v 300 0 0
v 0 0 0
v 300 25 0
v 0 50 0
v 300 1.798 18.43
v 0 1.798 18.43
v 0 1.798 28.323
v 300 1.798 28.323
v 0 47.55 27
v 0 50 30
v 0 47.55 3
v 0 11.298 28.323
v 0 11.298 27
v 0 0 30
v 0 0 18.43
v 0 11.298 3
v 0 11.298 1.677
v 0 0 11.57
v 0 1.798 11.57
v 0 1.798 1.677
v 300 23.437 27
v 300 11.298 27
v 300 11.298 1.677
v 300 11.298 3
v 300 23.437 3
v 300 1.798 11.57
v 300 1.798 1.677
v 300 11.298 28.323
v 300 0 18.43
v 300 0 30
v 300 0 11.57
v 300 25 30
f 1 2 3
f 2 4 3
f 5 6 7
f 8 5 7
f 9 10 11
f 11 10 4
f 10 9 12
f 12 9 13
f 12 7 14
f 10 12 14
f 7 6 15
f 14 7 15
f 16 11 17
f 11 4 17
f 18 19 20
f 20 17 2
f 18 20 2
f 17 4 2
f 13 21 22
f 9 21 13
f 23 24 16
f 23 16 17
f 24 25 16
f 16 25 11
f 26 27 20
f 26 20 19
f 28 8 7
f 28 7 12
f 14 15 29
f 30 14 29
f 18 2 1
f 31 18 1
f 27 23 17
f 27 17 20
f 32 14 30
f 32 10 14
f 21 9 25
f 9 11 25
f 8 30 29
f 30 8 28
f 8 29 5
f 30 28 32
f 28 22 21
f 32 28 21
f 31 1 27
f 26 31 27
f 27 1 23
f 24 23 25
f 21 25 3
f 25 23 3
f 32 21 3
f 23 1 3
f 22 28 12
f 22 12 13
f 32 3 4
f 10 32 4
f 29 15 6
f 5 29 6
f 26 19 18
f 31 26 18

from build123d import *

# Parameters (mm, degrees)
EXTRUDE_1_DEPTH          = 30
CUT_EXTRUDE_1_DEPTH      = 301
CUT_EXTRUDE_2_DEPTH      = 12
CUT_EXTRUDE_2_DEPTH_BACK = 12


with BuildPart() as part:
    # Эскиз1 → Бобышка-Вытянуть1 (new body)
    with BuildSketch(Plane.XY):
        Polygon((0, 0), (300, 0), (300, 25), (0, 50), align=None)
    extrude(amount=EXTRUDE_1_DEPTH)

    # Эскиз2 → Вырез-Вытянуть1 (cut, through all)
    with BuildSketch(Plane(origin=(300, 0, 0), x_dir=(0, 0, -1), z_dir=(1, 0, 0))):
        Polygon((-18.429564861, 0), (-18.429564861, 1.797684404), (-28.323382455, 1.797684404), (-28.323382455, 11.297500412), (-1.676617545, 11.297500412), (-1.676617545, 1.797684404), (-11.570435139, 1.797684404), (-11.570435139, 0), align=None)
    extrude(amount=-CUT_EXTRUDE_1_DEPTH, mode=Mode.SUBTRACT)

    # Эскиз3 → Вырез-Вытянуть2 (cut, two sides)
    with BuildSketch(Plane(origin=(0, 0, 15), x_dir=(-1, 0, 0), z_dir=(0, 0, -1))) as cut_extrude_2_sk:
        Polygon((-300, 7.808397482), (0, 7.808397482), (0, 47.550024082), (-300, 23.437127044), align=None)
    extrude(amount=CUT_EXTRUDE_2_DEPTH, mode=Mode.SUBTRACT)
    extrude(cut_extrude_2_sk.sketch, amount=-CUT_EXTRUDE_2_DEPTH_BACK, mode=Mode.SUBTRACT)


solid = part.part
